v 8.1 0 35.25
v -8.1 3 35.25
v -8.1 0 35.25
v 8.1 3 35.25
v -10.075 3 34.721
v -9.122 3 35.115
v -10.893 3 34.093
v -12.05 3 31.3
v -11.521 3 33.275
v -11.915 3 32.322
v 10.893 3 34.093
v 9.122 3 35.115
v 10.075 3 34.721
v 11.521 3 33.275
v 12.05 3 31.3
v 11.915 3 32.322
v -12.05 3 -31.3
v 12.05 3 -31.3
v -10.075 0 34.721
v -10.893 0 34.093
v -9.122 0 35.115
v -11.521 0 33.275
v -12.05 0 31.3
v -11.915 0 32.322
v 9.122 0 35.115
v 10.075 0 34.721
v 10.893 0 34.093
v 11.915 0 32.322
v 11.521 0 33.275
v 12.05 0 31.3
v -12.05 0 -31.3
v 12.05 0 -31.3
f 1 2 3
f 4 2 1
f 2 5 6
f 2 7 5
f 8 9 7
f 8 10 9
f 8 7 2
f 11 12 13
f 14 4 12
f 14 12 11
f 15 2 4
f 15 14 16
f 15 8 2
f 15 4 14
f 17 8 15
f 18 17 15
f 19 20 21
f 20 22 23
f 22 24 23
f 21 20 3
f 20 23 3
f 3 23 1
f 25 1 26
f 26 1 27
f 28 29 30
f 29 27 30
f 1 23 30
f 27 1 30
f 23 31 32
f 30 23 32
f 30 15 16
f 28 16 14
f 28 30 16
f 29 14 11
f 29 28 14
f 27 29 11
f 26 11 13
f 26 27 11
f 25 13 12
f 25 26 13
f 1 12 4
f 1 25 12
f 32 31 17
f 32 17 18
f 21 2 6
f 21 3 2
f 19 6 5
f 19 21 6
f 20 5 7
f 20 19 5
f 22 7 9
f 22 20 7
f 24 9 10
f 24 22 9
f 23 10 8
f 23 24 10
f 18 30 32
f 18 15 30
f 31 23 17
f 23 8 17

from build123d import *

# Parameters (mm, degrees)
SKETCH2_W           = 24.1
SKETCH2_H           = 62.6
BOSS_EXTRUDE3_DEPTH = 3
SKETCH3_W           = 24.1
SKETCH3_H           = 3.95
BOSS_EXTRUDE4_DEPTH = 3
FILLET1_R           = 3.95
FILLET2_R           = 3.95


with BuildPart() as part:
    # Sketch2 → Boss-Extrude3 (new body)
    with BuildSketch(Plane(origin=(0, 0, 0), x_dir=(1, 0, 0), z_dir=(0, 1, 0))):
        Rectangle(SKETCH2_W, SKETCH2_H)
    extrude(amount=BOSS_EXTRUDE3_DEPTH)

    # Sketch3 → Boss-Extrude4 (add)
    with BuildSketch(Plane(origin=(0, 3, 0), x_dir=(1, 0, 0), z_dir=(0, 1, 0))):
        with Locations((0, -33.275)):
            Rectangle(SKETCH3_W, SKETCH3_H)
    extrude(amount=-BOSS_EXTRUDE4_DEPTH)

    # Fillet1
    fillet1_edges = [part.edges().sort_by_distance(p)[0] for p in [
        (12.05, 1.5, 35.25),
    ]]
    fillet(fillet1_edges, radius=FILLET1_R)

    # Fillet2
    fillet2_edges = [part.edges().sort_by_distance(p)[0] for p in [
        (-12.05, 1.5, 35.25),
    ]]
    fillet(fillet2_edges, radius=FILLET2_R)


solid = part.part
